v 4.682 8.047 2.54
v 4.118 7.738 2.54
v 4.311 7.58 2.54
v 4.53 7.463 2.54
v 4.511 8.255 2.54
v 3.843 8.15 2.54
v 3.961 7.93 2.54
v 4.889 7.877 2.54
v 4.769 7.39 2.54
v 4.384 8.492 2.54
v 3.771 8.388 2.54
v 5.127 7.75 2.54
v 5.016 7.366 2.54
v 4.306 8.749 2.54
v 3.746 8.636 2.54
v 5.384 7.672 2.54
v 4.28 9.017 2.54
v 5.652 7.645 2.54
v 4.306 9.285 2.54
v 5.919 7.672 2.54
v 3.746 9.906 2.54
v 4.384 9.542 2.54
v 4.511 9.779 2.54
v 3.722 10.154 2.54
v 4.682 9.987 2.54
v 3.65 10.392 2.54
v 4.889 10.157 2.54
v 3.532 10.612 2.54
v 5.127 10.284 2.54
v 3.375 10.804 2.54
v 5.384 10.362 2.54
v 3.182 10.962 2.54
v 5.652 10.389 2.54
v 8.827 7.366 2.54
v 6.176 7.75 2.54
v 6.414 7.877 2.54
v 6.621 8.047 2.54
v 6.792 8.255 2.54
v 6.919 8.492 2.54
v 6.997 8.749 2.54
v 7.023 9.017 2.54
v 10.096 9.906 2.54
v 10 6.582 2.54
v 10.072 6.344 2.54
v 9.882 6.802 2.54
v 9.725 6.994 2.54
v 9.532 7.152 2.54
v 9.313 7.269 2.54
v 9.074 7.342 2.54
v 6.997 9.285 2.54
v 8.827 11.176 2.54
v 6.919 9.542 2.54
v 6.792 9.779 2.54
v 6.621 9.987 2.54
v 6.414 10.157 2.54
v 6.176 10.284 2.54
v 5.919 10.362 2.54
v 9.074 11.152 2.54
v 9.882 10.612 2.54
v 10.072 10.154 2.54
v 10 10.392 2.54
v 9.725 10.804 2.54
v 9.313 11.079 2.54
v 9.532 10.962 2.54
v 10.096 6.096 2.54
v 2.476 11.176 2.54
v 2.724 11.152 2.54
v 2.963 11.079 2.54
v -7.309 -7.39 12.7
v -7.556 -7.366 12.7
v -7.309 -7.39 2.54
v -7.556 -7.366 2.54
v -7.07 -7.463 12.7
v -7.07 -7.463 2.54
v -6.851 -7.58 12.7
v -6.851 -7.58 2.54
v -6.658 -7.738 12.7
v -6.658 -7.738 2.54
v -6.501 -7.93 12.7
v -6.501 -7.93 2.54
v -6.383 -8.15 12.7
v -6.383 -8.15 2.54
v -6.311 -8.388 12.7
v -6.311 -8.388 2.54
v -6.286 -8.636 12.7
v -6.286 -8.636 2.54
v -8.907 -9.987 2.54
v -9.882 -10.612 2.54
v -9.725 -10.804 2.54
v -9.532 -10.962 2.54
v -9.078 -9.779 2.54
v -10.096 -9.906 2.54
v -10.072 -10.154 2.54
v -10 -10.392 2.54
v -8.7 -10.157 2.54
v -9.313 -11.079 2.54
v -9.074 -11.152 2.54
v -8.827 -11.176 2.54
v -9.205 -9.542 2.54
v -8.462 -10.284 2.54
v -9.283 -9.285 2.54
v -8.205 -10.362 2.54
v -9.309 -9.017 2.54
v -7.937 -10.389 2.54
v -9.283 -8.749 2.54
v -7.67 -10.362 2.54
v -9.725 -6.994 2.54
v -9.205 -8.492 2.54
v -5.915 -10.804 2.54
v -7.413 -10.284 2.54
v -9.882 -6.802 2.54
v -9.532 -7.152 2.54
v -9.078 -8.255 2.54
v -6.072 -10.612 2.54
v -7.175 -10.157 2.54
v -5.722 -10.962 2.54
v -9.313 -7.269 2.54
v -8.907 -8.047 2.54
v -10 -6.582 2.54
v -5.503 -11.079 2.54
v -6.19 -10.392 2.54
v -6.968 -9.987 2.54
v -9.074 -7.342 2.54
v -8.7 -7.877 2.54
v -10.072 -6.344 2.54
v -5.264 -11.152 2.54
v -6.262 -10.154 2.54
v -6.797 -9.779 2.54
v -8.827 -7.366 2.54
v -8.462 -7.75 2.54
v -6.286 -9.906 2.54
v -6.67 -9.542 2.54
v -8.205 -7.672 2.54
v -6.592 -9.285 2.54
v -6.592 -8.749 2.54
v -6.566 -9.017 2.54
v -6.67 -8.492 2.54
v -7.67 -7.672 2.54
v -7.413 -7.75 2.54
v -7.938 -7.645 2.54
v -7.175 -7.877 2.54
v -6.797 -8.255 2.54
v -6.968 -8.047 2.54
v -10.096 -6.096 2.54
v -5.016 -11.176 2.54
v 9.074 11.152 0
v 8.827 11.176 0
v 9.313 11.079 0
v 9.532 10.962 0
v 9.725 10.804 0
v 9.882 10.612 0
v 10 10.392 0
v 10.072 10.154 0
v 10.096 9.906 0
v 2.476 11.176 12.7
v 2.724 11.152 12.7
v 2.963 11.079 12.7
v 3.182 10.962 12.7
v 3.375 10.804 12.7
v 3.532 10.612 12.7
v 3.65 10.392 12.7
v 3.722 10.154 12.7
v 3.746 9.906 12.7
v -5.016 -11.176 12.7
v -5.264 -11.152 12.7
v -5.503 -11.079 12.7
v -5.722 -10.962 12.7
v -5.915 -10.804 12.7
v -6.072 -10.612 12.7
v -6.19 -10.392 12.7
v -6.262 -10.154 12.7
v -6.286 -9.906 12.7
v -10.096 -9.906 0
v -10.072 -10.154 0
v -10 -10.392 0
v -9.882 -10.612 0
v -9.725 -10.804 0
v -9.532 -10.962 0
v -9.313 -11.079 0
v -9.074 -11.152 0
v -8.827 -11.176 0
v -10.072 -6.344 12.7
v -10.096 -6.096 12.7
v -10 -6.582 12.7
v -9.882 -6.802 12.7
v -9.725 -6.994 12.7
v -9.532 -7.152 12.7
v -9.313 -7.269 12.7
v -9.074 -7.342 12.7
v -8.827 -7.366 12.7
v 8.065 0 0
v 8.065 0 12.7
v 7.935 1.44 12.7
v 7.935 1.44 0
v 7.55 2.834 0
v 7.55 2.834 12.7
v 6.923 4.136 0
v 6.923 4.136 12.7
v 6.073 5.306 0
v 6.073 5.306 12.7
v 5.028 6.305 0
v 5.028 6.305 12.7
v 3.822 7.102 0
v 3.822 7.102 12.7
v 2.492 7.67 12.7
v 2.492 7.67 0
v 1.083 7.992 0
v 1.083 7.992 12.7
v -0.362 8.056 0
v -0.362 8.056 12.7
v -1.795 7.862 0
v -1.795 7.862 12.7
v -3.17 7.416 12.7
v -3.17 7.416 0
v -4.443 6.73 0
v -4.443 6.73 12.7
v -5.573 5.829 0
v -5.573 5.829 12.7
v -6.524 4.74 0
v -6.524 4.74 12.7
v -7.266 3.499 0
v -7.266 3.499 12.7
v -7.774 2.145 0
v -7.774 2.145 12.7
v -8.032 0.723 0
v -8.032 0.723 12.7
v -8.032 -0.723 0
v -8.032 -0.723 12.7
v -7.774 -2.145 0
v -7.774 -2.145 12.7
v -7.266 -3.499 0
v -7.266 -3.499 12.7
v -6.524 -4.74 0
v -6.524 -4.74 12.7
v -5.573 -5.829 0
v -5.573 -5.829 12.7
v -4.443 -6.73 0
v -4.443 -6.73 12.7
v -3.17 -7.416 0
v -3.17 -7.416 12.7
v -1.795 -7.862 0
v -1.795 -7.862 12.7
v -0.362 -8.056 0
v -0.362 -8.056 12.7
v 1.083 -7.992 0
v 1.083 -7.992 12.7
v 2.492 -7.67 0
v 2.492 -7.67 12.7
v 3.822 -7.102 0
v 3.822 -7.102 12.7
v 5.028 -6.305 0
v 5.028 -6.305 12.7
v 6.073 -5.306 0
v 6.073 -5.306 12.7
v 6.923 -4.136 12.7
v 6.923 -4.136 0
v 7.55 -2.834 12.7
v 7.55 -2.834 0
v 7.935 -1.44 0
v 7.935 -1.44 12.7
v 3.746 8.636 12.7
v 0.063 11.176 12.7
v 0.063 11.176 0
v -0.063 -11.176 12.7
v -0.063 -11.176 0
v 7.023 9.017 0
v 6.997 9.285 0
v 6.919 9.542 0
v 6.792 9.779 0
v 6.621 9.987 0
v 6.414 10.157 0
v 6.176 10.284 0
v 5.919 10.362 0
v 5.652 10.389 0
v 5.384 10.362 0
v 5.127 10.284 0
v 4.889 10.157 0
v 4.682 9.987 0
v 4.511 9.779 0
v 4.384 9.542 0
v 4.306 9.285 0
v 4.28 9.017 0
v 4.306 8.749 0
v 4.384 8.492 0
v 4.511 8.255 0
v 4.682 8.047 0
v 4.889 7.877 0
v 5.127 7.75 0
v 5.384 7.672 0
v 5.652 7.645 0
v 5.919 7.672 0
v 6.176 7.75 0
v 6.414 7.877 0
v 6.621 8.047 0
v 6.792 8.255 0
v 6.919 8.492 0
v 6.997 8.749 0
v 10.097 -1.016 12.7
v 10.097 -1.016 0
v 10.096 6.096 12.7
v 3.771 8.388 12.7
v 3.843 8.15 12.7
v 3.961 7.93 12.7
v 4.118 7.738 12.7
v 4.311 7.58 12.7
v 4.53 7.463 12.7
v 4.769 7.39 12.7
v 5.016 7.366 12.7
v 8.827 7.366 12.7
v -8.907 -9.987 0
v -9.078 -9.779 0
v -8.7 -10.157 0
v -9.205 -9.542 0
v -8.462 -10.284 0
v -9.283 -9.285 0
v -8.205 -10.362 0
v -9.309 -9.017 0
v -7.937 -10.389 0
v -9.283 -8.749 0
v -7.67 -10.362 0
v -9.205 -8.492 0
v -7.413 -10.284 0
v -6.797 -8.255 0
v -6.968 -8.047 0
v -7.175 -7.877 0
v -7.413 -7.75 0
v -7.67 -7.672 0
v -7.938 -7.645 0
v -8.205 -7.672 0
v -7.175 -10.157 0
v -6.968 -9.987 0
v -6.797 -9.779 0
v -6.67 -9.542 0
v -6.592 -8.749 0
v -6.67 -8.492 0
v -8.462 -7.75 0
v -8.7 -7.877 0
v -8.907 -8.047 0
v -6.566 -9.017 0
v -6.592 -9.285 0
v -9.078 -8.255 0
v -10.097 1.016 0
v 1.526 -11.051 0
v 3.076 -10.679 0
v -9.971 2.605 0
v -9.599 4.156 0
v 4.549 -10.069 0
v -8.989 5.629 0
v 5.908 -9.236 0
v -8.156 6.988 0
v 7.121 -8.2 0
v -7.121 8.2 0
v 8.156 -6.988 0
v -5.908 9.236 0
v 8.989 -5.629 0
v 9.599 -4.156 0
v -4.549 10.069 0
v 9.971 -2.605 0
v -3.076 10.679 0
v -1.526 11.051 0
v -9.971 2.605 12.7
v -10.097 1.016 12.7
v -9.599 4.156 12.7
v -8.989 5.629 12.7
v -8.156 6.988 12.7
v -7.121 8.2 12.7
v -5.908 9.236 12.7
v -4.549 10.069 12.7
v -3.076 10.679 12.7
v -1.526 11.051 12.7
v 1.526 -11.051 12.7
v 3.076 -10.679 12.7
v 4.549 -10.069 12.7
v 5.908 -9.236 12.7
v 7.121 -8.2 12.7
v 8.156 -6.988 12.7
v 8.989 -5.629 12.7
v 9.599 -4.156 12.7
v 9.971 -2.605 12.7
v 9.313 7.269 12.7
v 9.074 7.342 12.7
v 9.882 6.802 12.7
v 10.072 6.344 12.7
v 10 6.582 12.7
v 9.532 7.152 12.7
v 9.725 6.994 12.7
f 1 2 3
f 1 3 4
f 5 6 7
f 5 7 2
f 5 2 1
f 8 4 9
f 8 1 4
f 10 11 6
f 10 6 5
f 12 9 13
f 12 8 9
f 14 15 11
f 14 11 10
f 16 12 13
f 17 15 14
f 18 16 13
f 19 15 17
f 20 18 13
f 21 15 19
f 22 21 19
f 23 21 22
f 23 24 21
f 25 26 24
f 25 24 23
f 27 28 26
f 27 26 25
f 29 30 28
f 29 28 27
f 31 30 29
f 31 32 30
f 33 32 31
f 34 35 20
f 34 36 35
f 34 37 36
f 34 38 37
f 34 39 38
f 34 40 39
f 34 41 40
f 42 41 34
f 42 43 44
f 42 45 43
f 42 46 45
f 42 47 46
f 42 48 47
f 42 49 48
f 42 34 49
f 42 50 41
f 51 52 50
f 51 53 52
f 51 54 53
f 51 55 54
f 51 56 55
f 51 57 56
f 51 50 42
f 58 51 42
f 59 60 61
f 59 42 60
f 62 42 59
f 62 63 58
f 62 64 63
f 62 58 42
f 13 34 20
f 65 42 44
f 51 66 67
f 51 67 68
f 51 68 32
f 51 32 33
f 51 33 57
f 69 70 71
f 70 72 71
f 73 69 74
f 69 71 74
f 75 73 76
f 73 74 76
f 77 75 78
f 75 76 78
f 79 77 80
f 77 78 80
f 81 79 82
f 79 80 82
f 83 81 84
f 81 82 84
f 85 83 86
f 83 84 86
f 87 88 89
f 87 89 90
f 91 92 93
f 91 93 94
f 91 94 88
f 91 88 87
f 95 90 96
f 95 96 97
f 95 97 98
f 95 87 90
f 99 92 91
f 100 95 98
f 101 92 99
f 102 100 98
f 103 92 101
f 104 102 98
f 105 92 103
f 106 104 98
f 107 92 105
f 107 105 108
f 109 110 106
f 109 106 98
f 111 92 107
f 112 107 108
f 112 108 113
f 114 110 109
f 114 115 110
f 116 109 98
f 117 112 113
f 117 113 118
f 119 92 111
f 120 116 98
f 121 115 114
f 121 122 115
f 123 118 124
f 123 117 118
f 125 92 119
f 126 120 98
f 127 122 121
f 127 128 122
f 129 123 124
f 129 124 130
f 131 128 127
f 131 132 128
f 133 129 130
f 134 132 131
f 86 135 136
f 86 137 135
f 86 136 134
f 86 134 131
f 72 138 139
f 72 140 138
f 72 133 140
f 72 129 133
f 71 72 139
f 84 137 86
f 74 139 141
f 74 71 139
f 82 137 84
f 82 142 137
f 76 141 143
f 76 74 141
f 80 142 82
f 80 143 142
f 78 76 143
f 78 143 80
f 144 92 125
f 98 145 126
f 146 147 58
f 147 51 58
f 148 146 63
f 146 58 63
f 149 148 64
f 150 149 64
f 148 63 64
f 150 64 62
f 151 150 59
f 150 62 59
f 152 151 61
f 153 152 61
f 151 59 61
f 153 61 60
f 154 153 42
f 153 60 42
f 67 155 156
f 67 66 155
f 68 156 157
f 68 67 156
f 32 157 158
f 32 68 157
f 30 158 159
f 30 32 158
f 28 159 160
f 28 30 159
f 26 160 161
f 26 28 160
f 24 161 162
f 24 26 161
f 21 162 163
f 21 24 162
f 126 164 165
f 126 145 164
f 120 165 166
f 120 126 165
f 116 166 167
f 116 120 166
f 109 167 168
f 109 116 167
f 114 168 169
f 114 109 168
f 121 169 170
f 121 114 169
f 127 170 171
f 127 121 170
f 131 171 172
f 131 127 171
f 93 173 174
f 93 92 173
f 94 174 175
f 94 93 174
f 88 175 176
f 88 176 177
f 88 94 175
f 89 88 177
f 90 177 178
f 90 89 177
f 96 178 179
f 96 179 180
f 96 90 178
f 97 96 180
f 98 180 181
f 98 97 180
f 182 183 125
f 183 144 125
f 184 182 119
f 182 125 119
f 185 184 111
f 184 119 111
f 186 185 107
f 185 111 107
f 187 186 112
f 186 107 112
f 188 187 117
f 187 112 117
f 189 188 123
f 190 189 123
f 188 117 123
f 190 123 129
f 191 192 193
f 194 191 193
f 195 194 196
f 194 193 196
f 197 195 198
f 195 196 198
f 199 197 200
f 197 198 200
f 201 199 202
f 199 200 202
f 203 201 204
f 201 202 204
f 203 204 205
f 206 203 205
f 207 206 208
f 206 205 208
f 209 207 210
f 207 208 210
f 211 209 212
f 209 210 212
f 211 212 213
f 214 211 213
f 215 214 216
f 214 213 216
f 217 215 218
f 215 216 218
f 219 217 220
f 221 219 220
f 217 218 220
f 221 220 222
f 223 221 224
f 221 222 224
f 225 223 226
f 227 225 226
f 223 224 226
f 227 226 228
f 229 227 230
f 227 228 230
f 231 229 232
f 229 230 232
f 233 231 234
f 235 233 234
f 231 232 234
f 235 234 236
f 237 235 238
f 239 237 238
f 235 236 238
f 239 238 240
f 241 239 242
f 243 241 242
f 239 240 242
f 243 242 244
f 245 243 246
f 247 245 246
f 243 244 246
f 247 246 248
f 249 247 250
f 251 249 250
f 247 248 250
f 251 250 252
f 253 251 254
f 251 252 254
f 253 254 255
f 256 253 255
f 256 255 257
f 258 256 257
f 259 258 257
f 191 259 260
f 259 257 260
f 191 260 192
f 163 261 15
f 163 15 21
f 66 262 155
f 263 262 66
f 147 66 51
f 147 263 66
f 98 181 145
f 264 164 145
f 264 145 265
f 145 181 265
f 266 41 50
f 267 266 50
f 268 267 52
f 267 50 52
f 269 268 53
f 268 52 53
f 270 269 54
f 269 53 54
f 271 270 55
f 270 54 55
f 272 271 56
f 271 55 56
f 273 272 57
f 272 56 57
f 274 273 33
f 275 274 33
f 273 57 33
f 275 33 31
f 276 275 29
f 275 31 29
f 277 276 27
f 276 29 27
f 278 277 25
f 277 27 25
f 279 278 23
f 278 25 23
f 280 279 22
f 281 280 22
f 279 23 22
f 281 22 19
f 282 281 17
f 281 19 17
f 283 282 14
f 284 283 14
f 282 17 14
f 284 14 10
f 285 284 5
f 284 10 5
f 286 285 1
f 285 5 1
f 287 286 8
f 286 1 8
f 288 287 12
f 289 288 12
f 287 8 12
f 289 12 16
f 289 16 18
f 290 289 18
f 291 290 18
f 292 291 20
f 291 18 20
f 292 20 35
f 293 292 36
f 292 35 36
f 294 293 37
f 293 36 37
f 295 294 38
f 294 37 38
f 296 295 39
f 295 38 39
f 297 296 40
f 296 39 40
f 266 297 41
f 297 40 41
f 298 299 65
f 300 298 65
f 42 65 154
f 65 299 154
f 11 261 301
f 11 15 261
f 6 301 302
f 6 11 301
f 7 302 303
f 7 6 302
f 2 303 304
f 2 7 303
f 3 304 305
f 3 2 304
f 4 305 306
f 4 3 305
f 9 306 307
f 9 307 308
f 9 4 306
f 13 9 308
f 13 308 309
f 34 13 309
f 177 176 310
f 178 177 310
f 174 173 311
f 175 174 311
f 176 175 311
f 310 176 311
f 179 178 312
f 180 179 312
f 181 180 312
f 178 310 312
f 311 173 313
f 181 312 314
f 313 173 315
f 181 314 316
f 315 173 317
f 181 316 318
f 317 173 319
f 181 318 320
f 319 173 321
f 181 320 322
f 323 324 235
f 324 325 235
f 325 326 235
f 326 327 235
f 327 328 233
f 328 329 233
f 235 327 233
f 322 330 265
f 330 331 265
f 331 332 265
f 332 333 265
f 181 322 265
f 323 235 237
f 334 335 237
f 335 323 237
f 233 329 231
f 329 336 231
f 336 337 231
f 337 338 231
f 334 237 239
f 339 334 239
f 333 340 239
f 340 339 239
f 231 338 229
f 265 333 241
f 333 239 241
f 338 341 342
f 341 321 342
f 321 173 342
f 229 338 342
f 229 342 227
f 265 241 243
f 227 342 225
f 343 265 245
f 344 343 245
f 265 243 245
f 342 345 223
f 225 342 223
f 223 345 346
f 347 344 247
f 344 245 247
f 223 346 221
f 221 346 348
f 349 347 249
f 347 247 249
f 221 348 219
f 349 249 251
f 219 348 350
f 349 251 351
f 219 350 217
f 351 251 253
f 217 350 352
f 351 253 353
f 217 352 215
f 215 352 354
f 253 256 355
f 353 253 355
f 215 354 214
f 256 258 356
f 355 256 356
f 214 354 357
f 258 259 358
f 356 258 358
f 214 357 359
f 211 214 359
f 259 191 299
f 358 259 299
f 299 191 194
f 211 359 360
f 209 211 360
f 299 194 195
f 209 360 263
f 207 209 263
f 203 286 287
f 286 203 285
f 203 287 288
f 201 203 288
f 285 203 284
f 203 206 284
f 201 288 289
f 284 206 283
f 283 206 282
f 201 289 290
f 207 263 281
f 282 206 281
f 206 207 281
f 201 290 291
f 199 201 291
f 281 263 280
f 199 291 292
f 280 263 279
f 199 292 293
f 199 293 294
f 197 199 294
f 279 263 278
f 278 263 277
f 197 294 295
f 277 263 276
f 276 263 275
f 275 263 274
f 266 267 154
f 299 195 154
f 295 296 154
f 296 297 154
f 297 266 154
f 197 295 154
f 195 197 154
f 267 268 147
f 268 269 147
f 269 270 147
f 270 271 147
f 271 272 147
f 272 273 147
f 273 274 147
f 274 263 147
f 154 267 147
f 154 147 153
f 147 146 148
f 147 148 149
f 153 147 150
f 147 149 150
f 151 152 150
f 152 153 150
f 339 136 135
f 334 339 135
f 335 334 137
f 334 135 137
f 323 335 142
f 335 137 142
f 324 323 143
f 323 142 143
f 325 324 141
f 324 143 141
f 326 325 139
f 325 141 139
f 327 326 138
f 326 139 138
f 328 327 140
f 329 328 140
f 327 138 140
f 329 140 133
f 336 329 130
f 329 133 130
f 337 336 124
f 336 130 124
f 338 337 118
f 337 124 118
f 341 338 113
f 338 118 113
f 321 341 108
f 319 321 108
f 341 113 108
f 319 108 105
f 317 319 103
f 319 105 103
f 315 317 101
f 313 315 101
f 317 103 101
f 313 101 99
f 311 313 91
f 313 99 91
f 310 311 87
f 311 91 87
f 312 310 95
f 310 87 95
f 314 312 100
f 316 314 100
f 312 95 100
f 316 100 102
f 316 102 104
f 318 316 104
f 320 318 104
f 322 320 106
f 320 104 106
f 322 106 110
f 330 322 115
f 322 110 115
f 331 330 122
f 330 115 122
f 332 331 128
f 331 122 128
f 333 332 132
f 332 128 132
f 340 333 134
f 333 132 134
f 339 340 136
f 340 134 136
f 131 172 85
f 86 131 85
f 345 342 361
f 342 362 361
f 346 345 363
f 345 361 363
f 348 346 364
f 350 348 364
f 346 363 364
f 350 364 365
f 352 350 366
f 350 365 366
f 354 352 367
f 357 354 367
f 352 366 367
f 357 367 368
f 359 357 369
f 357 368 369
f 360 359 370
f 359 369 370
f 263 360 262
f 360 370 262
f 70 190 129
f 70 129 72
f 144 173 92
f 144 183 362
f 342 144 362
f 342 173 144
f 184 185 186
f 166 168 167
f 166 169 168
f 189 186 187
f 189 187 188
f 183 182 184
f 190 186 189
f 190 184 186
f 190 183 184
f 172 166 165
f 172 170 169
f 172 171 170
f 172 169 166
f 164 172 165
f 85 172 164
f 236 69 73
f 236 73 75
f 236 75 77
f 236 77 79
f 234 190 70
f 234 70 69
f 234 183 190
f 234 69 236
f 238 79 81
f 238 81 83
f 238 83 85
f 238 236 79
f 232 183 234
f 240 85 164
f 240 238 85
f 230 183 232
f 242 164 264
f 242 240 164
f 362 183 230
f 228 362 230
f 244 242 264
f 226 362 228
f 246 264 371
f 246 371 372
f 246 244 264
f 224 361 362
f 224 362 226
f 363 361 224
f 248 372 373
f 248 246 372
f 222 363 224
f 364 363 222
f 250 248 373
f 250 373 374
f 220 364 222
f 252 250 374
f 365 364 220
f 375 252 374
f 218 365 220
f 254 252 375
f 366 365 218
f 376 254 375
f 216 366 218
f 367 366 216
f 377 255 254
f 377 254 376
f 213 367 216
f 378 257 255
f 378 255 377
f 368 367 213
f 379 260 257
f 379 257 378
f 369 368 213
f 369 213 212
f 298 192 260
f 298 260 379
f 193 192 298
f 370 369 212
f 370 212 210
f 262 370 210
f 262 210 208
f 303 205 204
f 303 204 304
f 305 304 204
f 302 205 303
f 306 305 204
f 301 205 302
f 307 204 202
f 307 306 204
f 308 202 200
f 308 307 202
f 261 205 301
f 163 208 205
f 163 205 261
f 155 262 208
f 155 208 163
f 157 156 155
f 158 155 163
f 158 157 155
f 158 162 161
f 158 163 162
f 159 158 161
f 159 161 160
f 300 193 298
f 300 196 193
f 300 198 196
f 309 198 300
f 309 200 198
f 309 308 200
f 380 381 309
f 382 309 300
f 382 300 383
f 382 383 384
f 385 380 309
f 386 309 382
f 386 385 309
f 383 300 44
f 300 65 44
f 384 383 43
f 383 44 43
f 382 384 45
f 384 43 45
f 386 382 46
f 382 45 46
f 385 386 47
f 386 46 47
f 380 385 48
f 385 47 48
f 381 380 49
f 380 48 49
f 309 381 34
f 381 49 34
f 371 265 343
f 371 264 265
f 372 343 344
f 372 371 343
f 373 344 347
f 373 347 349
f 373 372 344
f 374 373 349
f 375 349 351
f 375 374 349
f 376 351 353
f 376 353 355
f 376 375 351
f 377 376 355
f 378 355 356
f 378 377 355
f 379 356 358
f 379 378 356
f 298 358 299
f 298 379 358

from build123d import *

# Parameters (mm, degrees)
F0_W      = 20.193
F0_H      = 22.352
F1_DEPTH  = 12.7
F2_R      = 8.0645
F3_DEPTH  = 12.7
F5_W      = 3.81
F5_H      = 3.81
F6_DEPTH  = 10.16
F4_W      = 6.35
F4_H      = 3.81
F7_DEPTH  = 10.16
F8_R      = 10.16
F9_R      = 1.27
F11_R     = 1.3716
F12_DEPTH = 2.54
F10_R     = 1.3716
F13_DEPTH = 2.54


with BuildPart() as f1:
    # F0 (on Top) → F1 (new body)
    with BuildSketch(Plane.XY):
        Rectangle(F0_W, F0_H)
    extrude(amount=F1_DEPTH)

    # F2 (on face) → F3 (cut)
    with BuildSketch(Plane.XY.offset(12.7)):
        Circle(F2_R)
    extrude(amount=-F3_DEPTH, mode=Mode.SUBTRACT)

    # F5 (on face) → F6 (cut)
    with BuildSketch(Plane.XY.offset(12.7)):
        with Locations((-8.1915, -9.271)):
            Rectangle(F5_W, F5_H)
    extrude(amount=-F6_DEPTH, mode=Mode.SUBTRACT)

    # F4 (on face) → F7 (cut)
    with BuildSketch(Plane.XY.offset(12.7)):
        with Locations((6.9215, 9.271)):
            Rectangle(F4_W, F4_H)
    extrude(amount=-F7_DEPTH, mode=Mode.SUBTRACT)

    # F8
    f8_edges = [f1.edges().sort_by_distance(p)[0] for p in [
        (-10.0965, 11.176, 6.35),
        (10.0965, -11.176, 6.35),
    ]]
    fillet(f8_edges, radius=F8_R)

    # F9
    f9_edges = [f1.edges().sort_by_distance(p)[0] for p in [
        (-10.0965, -7.366, 7.62),
        (-6.2865, -11.176, 7.62),
        (3.7465, 11.176, 7.62),
        (10.0965, 7.366, 7.62),
        (3.7465, 7.366, 7.62),
        (-6.2865, -7.366, 7.62),
        (-10.0965, -11.176, 1.27),
        (10.0965, 11.176, 1.27),
    ]]
    fillet(f9_edges, radius=F9_R)

    # F11 (on face) → F12 (cut)
    with BuildSketch(Plane.XY.offset(2.54)):
        with Locations((-7.9375, -9.017)):
            Circle(F11_R)
    extrude(amount=-F12_DEPTH, mode=Mode.SUBTRACT)

    # F10 (on face) → F13 (cut)
    with BuildSketch(Plane.XY.offset(2.54)):
        with Locations((5.6515, 9.017)):
            Circle(F10_R)
    extrude(amount=-F13_DEPTH, mode=Mode.SUBTRACT)


solid = f1.part
